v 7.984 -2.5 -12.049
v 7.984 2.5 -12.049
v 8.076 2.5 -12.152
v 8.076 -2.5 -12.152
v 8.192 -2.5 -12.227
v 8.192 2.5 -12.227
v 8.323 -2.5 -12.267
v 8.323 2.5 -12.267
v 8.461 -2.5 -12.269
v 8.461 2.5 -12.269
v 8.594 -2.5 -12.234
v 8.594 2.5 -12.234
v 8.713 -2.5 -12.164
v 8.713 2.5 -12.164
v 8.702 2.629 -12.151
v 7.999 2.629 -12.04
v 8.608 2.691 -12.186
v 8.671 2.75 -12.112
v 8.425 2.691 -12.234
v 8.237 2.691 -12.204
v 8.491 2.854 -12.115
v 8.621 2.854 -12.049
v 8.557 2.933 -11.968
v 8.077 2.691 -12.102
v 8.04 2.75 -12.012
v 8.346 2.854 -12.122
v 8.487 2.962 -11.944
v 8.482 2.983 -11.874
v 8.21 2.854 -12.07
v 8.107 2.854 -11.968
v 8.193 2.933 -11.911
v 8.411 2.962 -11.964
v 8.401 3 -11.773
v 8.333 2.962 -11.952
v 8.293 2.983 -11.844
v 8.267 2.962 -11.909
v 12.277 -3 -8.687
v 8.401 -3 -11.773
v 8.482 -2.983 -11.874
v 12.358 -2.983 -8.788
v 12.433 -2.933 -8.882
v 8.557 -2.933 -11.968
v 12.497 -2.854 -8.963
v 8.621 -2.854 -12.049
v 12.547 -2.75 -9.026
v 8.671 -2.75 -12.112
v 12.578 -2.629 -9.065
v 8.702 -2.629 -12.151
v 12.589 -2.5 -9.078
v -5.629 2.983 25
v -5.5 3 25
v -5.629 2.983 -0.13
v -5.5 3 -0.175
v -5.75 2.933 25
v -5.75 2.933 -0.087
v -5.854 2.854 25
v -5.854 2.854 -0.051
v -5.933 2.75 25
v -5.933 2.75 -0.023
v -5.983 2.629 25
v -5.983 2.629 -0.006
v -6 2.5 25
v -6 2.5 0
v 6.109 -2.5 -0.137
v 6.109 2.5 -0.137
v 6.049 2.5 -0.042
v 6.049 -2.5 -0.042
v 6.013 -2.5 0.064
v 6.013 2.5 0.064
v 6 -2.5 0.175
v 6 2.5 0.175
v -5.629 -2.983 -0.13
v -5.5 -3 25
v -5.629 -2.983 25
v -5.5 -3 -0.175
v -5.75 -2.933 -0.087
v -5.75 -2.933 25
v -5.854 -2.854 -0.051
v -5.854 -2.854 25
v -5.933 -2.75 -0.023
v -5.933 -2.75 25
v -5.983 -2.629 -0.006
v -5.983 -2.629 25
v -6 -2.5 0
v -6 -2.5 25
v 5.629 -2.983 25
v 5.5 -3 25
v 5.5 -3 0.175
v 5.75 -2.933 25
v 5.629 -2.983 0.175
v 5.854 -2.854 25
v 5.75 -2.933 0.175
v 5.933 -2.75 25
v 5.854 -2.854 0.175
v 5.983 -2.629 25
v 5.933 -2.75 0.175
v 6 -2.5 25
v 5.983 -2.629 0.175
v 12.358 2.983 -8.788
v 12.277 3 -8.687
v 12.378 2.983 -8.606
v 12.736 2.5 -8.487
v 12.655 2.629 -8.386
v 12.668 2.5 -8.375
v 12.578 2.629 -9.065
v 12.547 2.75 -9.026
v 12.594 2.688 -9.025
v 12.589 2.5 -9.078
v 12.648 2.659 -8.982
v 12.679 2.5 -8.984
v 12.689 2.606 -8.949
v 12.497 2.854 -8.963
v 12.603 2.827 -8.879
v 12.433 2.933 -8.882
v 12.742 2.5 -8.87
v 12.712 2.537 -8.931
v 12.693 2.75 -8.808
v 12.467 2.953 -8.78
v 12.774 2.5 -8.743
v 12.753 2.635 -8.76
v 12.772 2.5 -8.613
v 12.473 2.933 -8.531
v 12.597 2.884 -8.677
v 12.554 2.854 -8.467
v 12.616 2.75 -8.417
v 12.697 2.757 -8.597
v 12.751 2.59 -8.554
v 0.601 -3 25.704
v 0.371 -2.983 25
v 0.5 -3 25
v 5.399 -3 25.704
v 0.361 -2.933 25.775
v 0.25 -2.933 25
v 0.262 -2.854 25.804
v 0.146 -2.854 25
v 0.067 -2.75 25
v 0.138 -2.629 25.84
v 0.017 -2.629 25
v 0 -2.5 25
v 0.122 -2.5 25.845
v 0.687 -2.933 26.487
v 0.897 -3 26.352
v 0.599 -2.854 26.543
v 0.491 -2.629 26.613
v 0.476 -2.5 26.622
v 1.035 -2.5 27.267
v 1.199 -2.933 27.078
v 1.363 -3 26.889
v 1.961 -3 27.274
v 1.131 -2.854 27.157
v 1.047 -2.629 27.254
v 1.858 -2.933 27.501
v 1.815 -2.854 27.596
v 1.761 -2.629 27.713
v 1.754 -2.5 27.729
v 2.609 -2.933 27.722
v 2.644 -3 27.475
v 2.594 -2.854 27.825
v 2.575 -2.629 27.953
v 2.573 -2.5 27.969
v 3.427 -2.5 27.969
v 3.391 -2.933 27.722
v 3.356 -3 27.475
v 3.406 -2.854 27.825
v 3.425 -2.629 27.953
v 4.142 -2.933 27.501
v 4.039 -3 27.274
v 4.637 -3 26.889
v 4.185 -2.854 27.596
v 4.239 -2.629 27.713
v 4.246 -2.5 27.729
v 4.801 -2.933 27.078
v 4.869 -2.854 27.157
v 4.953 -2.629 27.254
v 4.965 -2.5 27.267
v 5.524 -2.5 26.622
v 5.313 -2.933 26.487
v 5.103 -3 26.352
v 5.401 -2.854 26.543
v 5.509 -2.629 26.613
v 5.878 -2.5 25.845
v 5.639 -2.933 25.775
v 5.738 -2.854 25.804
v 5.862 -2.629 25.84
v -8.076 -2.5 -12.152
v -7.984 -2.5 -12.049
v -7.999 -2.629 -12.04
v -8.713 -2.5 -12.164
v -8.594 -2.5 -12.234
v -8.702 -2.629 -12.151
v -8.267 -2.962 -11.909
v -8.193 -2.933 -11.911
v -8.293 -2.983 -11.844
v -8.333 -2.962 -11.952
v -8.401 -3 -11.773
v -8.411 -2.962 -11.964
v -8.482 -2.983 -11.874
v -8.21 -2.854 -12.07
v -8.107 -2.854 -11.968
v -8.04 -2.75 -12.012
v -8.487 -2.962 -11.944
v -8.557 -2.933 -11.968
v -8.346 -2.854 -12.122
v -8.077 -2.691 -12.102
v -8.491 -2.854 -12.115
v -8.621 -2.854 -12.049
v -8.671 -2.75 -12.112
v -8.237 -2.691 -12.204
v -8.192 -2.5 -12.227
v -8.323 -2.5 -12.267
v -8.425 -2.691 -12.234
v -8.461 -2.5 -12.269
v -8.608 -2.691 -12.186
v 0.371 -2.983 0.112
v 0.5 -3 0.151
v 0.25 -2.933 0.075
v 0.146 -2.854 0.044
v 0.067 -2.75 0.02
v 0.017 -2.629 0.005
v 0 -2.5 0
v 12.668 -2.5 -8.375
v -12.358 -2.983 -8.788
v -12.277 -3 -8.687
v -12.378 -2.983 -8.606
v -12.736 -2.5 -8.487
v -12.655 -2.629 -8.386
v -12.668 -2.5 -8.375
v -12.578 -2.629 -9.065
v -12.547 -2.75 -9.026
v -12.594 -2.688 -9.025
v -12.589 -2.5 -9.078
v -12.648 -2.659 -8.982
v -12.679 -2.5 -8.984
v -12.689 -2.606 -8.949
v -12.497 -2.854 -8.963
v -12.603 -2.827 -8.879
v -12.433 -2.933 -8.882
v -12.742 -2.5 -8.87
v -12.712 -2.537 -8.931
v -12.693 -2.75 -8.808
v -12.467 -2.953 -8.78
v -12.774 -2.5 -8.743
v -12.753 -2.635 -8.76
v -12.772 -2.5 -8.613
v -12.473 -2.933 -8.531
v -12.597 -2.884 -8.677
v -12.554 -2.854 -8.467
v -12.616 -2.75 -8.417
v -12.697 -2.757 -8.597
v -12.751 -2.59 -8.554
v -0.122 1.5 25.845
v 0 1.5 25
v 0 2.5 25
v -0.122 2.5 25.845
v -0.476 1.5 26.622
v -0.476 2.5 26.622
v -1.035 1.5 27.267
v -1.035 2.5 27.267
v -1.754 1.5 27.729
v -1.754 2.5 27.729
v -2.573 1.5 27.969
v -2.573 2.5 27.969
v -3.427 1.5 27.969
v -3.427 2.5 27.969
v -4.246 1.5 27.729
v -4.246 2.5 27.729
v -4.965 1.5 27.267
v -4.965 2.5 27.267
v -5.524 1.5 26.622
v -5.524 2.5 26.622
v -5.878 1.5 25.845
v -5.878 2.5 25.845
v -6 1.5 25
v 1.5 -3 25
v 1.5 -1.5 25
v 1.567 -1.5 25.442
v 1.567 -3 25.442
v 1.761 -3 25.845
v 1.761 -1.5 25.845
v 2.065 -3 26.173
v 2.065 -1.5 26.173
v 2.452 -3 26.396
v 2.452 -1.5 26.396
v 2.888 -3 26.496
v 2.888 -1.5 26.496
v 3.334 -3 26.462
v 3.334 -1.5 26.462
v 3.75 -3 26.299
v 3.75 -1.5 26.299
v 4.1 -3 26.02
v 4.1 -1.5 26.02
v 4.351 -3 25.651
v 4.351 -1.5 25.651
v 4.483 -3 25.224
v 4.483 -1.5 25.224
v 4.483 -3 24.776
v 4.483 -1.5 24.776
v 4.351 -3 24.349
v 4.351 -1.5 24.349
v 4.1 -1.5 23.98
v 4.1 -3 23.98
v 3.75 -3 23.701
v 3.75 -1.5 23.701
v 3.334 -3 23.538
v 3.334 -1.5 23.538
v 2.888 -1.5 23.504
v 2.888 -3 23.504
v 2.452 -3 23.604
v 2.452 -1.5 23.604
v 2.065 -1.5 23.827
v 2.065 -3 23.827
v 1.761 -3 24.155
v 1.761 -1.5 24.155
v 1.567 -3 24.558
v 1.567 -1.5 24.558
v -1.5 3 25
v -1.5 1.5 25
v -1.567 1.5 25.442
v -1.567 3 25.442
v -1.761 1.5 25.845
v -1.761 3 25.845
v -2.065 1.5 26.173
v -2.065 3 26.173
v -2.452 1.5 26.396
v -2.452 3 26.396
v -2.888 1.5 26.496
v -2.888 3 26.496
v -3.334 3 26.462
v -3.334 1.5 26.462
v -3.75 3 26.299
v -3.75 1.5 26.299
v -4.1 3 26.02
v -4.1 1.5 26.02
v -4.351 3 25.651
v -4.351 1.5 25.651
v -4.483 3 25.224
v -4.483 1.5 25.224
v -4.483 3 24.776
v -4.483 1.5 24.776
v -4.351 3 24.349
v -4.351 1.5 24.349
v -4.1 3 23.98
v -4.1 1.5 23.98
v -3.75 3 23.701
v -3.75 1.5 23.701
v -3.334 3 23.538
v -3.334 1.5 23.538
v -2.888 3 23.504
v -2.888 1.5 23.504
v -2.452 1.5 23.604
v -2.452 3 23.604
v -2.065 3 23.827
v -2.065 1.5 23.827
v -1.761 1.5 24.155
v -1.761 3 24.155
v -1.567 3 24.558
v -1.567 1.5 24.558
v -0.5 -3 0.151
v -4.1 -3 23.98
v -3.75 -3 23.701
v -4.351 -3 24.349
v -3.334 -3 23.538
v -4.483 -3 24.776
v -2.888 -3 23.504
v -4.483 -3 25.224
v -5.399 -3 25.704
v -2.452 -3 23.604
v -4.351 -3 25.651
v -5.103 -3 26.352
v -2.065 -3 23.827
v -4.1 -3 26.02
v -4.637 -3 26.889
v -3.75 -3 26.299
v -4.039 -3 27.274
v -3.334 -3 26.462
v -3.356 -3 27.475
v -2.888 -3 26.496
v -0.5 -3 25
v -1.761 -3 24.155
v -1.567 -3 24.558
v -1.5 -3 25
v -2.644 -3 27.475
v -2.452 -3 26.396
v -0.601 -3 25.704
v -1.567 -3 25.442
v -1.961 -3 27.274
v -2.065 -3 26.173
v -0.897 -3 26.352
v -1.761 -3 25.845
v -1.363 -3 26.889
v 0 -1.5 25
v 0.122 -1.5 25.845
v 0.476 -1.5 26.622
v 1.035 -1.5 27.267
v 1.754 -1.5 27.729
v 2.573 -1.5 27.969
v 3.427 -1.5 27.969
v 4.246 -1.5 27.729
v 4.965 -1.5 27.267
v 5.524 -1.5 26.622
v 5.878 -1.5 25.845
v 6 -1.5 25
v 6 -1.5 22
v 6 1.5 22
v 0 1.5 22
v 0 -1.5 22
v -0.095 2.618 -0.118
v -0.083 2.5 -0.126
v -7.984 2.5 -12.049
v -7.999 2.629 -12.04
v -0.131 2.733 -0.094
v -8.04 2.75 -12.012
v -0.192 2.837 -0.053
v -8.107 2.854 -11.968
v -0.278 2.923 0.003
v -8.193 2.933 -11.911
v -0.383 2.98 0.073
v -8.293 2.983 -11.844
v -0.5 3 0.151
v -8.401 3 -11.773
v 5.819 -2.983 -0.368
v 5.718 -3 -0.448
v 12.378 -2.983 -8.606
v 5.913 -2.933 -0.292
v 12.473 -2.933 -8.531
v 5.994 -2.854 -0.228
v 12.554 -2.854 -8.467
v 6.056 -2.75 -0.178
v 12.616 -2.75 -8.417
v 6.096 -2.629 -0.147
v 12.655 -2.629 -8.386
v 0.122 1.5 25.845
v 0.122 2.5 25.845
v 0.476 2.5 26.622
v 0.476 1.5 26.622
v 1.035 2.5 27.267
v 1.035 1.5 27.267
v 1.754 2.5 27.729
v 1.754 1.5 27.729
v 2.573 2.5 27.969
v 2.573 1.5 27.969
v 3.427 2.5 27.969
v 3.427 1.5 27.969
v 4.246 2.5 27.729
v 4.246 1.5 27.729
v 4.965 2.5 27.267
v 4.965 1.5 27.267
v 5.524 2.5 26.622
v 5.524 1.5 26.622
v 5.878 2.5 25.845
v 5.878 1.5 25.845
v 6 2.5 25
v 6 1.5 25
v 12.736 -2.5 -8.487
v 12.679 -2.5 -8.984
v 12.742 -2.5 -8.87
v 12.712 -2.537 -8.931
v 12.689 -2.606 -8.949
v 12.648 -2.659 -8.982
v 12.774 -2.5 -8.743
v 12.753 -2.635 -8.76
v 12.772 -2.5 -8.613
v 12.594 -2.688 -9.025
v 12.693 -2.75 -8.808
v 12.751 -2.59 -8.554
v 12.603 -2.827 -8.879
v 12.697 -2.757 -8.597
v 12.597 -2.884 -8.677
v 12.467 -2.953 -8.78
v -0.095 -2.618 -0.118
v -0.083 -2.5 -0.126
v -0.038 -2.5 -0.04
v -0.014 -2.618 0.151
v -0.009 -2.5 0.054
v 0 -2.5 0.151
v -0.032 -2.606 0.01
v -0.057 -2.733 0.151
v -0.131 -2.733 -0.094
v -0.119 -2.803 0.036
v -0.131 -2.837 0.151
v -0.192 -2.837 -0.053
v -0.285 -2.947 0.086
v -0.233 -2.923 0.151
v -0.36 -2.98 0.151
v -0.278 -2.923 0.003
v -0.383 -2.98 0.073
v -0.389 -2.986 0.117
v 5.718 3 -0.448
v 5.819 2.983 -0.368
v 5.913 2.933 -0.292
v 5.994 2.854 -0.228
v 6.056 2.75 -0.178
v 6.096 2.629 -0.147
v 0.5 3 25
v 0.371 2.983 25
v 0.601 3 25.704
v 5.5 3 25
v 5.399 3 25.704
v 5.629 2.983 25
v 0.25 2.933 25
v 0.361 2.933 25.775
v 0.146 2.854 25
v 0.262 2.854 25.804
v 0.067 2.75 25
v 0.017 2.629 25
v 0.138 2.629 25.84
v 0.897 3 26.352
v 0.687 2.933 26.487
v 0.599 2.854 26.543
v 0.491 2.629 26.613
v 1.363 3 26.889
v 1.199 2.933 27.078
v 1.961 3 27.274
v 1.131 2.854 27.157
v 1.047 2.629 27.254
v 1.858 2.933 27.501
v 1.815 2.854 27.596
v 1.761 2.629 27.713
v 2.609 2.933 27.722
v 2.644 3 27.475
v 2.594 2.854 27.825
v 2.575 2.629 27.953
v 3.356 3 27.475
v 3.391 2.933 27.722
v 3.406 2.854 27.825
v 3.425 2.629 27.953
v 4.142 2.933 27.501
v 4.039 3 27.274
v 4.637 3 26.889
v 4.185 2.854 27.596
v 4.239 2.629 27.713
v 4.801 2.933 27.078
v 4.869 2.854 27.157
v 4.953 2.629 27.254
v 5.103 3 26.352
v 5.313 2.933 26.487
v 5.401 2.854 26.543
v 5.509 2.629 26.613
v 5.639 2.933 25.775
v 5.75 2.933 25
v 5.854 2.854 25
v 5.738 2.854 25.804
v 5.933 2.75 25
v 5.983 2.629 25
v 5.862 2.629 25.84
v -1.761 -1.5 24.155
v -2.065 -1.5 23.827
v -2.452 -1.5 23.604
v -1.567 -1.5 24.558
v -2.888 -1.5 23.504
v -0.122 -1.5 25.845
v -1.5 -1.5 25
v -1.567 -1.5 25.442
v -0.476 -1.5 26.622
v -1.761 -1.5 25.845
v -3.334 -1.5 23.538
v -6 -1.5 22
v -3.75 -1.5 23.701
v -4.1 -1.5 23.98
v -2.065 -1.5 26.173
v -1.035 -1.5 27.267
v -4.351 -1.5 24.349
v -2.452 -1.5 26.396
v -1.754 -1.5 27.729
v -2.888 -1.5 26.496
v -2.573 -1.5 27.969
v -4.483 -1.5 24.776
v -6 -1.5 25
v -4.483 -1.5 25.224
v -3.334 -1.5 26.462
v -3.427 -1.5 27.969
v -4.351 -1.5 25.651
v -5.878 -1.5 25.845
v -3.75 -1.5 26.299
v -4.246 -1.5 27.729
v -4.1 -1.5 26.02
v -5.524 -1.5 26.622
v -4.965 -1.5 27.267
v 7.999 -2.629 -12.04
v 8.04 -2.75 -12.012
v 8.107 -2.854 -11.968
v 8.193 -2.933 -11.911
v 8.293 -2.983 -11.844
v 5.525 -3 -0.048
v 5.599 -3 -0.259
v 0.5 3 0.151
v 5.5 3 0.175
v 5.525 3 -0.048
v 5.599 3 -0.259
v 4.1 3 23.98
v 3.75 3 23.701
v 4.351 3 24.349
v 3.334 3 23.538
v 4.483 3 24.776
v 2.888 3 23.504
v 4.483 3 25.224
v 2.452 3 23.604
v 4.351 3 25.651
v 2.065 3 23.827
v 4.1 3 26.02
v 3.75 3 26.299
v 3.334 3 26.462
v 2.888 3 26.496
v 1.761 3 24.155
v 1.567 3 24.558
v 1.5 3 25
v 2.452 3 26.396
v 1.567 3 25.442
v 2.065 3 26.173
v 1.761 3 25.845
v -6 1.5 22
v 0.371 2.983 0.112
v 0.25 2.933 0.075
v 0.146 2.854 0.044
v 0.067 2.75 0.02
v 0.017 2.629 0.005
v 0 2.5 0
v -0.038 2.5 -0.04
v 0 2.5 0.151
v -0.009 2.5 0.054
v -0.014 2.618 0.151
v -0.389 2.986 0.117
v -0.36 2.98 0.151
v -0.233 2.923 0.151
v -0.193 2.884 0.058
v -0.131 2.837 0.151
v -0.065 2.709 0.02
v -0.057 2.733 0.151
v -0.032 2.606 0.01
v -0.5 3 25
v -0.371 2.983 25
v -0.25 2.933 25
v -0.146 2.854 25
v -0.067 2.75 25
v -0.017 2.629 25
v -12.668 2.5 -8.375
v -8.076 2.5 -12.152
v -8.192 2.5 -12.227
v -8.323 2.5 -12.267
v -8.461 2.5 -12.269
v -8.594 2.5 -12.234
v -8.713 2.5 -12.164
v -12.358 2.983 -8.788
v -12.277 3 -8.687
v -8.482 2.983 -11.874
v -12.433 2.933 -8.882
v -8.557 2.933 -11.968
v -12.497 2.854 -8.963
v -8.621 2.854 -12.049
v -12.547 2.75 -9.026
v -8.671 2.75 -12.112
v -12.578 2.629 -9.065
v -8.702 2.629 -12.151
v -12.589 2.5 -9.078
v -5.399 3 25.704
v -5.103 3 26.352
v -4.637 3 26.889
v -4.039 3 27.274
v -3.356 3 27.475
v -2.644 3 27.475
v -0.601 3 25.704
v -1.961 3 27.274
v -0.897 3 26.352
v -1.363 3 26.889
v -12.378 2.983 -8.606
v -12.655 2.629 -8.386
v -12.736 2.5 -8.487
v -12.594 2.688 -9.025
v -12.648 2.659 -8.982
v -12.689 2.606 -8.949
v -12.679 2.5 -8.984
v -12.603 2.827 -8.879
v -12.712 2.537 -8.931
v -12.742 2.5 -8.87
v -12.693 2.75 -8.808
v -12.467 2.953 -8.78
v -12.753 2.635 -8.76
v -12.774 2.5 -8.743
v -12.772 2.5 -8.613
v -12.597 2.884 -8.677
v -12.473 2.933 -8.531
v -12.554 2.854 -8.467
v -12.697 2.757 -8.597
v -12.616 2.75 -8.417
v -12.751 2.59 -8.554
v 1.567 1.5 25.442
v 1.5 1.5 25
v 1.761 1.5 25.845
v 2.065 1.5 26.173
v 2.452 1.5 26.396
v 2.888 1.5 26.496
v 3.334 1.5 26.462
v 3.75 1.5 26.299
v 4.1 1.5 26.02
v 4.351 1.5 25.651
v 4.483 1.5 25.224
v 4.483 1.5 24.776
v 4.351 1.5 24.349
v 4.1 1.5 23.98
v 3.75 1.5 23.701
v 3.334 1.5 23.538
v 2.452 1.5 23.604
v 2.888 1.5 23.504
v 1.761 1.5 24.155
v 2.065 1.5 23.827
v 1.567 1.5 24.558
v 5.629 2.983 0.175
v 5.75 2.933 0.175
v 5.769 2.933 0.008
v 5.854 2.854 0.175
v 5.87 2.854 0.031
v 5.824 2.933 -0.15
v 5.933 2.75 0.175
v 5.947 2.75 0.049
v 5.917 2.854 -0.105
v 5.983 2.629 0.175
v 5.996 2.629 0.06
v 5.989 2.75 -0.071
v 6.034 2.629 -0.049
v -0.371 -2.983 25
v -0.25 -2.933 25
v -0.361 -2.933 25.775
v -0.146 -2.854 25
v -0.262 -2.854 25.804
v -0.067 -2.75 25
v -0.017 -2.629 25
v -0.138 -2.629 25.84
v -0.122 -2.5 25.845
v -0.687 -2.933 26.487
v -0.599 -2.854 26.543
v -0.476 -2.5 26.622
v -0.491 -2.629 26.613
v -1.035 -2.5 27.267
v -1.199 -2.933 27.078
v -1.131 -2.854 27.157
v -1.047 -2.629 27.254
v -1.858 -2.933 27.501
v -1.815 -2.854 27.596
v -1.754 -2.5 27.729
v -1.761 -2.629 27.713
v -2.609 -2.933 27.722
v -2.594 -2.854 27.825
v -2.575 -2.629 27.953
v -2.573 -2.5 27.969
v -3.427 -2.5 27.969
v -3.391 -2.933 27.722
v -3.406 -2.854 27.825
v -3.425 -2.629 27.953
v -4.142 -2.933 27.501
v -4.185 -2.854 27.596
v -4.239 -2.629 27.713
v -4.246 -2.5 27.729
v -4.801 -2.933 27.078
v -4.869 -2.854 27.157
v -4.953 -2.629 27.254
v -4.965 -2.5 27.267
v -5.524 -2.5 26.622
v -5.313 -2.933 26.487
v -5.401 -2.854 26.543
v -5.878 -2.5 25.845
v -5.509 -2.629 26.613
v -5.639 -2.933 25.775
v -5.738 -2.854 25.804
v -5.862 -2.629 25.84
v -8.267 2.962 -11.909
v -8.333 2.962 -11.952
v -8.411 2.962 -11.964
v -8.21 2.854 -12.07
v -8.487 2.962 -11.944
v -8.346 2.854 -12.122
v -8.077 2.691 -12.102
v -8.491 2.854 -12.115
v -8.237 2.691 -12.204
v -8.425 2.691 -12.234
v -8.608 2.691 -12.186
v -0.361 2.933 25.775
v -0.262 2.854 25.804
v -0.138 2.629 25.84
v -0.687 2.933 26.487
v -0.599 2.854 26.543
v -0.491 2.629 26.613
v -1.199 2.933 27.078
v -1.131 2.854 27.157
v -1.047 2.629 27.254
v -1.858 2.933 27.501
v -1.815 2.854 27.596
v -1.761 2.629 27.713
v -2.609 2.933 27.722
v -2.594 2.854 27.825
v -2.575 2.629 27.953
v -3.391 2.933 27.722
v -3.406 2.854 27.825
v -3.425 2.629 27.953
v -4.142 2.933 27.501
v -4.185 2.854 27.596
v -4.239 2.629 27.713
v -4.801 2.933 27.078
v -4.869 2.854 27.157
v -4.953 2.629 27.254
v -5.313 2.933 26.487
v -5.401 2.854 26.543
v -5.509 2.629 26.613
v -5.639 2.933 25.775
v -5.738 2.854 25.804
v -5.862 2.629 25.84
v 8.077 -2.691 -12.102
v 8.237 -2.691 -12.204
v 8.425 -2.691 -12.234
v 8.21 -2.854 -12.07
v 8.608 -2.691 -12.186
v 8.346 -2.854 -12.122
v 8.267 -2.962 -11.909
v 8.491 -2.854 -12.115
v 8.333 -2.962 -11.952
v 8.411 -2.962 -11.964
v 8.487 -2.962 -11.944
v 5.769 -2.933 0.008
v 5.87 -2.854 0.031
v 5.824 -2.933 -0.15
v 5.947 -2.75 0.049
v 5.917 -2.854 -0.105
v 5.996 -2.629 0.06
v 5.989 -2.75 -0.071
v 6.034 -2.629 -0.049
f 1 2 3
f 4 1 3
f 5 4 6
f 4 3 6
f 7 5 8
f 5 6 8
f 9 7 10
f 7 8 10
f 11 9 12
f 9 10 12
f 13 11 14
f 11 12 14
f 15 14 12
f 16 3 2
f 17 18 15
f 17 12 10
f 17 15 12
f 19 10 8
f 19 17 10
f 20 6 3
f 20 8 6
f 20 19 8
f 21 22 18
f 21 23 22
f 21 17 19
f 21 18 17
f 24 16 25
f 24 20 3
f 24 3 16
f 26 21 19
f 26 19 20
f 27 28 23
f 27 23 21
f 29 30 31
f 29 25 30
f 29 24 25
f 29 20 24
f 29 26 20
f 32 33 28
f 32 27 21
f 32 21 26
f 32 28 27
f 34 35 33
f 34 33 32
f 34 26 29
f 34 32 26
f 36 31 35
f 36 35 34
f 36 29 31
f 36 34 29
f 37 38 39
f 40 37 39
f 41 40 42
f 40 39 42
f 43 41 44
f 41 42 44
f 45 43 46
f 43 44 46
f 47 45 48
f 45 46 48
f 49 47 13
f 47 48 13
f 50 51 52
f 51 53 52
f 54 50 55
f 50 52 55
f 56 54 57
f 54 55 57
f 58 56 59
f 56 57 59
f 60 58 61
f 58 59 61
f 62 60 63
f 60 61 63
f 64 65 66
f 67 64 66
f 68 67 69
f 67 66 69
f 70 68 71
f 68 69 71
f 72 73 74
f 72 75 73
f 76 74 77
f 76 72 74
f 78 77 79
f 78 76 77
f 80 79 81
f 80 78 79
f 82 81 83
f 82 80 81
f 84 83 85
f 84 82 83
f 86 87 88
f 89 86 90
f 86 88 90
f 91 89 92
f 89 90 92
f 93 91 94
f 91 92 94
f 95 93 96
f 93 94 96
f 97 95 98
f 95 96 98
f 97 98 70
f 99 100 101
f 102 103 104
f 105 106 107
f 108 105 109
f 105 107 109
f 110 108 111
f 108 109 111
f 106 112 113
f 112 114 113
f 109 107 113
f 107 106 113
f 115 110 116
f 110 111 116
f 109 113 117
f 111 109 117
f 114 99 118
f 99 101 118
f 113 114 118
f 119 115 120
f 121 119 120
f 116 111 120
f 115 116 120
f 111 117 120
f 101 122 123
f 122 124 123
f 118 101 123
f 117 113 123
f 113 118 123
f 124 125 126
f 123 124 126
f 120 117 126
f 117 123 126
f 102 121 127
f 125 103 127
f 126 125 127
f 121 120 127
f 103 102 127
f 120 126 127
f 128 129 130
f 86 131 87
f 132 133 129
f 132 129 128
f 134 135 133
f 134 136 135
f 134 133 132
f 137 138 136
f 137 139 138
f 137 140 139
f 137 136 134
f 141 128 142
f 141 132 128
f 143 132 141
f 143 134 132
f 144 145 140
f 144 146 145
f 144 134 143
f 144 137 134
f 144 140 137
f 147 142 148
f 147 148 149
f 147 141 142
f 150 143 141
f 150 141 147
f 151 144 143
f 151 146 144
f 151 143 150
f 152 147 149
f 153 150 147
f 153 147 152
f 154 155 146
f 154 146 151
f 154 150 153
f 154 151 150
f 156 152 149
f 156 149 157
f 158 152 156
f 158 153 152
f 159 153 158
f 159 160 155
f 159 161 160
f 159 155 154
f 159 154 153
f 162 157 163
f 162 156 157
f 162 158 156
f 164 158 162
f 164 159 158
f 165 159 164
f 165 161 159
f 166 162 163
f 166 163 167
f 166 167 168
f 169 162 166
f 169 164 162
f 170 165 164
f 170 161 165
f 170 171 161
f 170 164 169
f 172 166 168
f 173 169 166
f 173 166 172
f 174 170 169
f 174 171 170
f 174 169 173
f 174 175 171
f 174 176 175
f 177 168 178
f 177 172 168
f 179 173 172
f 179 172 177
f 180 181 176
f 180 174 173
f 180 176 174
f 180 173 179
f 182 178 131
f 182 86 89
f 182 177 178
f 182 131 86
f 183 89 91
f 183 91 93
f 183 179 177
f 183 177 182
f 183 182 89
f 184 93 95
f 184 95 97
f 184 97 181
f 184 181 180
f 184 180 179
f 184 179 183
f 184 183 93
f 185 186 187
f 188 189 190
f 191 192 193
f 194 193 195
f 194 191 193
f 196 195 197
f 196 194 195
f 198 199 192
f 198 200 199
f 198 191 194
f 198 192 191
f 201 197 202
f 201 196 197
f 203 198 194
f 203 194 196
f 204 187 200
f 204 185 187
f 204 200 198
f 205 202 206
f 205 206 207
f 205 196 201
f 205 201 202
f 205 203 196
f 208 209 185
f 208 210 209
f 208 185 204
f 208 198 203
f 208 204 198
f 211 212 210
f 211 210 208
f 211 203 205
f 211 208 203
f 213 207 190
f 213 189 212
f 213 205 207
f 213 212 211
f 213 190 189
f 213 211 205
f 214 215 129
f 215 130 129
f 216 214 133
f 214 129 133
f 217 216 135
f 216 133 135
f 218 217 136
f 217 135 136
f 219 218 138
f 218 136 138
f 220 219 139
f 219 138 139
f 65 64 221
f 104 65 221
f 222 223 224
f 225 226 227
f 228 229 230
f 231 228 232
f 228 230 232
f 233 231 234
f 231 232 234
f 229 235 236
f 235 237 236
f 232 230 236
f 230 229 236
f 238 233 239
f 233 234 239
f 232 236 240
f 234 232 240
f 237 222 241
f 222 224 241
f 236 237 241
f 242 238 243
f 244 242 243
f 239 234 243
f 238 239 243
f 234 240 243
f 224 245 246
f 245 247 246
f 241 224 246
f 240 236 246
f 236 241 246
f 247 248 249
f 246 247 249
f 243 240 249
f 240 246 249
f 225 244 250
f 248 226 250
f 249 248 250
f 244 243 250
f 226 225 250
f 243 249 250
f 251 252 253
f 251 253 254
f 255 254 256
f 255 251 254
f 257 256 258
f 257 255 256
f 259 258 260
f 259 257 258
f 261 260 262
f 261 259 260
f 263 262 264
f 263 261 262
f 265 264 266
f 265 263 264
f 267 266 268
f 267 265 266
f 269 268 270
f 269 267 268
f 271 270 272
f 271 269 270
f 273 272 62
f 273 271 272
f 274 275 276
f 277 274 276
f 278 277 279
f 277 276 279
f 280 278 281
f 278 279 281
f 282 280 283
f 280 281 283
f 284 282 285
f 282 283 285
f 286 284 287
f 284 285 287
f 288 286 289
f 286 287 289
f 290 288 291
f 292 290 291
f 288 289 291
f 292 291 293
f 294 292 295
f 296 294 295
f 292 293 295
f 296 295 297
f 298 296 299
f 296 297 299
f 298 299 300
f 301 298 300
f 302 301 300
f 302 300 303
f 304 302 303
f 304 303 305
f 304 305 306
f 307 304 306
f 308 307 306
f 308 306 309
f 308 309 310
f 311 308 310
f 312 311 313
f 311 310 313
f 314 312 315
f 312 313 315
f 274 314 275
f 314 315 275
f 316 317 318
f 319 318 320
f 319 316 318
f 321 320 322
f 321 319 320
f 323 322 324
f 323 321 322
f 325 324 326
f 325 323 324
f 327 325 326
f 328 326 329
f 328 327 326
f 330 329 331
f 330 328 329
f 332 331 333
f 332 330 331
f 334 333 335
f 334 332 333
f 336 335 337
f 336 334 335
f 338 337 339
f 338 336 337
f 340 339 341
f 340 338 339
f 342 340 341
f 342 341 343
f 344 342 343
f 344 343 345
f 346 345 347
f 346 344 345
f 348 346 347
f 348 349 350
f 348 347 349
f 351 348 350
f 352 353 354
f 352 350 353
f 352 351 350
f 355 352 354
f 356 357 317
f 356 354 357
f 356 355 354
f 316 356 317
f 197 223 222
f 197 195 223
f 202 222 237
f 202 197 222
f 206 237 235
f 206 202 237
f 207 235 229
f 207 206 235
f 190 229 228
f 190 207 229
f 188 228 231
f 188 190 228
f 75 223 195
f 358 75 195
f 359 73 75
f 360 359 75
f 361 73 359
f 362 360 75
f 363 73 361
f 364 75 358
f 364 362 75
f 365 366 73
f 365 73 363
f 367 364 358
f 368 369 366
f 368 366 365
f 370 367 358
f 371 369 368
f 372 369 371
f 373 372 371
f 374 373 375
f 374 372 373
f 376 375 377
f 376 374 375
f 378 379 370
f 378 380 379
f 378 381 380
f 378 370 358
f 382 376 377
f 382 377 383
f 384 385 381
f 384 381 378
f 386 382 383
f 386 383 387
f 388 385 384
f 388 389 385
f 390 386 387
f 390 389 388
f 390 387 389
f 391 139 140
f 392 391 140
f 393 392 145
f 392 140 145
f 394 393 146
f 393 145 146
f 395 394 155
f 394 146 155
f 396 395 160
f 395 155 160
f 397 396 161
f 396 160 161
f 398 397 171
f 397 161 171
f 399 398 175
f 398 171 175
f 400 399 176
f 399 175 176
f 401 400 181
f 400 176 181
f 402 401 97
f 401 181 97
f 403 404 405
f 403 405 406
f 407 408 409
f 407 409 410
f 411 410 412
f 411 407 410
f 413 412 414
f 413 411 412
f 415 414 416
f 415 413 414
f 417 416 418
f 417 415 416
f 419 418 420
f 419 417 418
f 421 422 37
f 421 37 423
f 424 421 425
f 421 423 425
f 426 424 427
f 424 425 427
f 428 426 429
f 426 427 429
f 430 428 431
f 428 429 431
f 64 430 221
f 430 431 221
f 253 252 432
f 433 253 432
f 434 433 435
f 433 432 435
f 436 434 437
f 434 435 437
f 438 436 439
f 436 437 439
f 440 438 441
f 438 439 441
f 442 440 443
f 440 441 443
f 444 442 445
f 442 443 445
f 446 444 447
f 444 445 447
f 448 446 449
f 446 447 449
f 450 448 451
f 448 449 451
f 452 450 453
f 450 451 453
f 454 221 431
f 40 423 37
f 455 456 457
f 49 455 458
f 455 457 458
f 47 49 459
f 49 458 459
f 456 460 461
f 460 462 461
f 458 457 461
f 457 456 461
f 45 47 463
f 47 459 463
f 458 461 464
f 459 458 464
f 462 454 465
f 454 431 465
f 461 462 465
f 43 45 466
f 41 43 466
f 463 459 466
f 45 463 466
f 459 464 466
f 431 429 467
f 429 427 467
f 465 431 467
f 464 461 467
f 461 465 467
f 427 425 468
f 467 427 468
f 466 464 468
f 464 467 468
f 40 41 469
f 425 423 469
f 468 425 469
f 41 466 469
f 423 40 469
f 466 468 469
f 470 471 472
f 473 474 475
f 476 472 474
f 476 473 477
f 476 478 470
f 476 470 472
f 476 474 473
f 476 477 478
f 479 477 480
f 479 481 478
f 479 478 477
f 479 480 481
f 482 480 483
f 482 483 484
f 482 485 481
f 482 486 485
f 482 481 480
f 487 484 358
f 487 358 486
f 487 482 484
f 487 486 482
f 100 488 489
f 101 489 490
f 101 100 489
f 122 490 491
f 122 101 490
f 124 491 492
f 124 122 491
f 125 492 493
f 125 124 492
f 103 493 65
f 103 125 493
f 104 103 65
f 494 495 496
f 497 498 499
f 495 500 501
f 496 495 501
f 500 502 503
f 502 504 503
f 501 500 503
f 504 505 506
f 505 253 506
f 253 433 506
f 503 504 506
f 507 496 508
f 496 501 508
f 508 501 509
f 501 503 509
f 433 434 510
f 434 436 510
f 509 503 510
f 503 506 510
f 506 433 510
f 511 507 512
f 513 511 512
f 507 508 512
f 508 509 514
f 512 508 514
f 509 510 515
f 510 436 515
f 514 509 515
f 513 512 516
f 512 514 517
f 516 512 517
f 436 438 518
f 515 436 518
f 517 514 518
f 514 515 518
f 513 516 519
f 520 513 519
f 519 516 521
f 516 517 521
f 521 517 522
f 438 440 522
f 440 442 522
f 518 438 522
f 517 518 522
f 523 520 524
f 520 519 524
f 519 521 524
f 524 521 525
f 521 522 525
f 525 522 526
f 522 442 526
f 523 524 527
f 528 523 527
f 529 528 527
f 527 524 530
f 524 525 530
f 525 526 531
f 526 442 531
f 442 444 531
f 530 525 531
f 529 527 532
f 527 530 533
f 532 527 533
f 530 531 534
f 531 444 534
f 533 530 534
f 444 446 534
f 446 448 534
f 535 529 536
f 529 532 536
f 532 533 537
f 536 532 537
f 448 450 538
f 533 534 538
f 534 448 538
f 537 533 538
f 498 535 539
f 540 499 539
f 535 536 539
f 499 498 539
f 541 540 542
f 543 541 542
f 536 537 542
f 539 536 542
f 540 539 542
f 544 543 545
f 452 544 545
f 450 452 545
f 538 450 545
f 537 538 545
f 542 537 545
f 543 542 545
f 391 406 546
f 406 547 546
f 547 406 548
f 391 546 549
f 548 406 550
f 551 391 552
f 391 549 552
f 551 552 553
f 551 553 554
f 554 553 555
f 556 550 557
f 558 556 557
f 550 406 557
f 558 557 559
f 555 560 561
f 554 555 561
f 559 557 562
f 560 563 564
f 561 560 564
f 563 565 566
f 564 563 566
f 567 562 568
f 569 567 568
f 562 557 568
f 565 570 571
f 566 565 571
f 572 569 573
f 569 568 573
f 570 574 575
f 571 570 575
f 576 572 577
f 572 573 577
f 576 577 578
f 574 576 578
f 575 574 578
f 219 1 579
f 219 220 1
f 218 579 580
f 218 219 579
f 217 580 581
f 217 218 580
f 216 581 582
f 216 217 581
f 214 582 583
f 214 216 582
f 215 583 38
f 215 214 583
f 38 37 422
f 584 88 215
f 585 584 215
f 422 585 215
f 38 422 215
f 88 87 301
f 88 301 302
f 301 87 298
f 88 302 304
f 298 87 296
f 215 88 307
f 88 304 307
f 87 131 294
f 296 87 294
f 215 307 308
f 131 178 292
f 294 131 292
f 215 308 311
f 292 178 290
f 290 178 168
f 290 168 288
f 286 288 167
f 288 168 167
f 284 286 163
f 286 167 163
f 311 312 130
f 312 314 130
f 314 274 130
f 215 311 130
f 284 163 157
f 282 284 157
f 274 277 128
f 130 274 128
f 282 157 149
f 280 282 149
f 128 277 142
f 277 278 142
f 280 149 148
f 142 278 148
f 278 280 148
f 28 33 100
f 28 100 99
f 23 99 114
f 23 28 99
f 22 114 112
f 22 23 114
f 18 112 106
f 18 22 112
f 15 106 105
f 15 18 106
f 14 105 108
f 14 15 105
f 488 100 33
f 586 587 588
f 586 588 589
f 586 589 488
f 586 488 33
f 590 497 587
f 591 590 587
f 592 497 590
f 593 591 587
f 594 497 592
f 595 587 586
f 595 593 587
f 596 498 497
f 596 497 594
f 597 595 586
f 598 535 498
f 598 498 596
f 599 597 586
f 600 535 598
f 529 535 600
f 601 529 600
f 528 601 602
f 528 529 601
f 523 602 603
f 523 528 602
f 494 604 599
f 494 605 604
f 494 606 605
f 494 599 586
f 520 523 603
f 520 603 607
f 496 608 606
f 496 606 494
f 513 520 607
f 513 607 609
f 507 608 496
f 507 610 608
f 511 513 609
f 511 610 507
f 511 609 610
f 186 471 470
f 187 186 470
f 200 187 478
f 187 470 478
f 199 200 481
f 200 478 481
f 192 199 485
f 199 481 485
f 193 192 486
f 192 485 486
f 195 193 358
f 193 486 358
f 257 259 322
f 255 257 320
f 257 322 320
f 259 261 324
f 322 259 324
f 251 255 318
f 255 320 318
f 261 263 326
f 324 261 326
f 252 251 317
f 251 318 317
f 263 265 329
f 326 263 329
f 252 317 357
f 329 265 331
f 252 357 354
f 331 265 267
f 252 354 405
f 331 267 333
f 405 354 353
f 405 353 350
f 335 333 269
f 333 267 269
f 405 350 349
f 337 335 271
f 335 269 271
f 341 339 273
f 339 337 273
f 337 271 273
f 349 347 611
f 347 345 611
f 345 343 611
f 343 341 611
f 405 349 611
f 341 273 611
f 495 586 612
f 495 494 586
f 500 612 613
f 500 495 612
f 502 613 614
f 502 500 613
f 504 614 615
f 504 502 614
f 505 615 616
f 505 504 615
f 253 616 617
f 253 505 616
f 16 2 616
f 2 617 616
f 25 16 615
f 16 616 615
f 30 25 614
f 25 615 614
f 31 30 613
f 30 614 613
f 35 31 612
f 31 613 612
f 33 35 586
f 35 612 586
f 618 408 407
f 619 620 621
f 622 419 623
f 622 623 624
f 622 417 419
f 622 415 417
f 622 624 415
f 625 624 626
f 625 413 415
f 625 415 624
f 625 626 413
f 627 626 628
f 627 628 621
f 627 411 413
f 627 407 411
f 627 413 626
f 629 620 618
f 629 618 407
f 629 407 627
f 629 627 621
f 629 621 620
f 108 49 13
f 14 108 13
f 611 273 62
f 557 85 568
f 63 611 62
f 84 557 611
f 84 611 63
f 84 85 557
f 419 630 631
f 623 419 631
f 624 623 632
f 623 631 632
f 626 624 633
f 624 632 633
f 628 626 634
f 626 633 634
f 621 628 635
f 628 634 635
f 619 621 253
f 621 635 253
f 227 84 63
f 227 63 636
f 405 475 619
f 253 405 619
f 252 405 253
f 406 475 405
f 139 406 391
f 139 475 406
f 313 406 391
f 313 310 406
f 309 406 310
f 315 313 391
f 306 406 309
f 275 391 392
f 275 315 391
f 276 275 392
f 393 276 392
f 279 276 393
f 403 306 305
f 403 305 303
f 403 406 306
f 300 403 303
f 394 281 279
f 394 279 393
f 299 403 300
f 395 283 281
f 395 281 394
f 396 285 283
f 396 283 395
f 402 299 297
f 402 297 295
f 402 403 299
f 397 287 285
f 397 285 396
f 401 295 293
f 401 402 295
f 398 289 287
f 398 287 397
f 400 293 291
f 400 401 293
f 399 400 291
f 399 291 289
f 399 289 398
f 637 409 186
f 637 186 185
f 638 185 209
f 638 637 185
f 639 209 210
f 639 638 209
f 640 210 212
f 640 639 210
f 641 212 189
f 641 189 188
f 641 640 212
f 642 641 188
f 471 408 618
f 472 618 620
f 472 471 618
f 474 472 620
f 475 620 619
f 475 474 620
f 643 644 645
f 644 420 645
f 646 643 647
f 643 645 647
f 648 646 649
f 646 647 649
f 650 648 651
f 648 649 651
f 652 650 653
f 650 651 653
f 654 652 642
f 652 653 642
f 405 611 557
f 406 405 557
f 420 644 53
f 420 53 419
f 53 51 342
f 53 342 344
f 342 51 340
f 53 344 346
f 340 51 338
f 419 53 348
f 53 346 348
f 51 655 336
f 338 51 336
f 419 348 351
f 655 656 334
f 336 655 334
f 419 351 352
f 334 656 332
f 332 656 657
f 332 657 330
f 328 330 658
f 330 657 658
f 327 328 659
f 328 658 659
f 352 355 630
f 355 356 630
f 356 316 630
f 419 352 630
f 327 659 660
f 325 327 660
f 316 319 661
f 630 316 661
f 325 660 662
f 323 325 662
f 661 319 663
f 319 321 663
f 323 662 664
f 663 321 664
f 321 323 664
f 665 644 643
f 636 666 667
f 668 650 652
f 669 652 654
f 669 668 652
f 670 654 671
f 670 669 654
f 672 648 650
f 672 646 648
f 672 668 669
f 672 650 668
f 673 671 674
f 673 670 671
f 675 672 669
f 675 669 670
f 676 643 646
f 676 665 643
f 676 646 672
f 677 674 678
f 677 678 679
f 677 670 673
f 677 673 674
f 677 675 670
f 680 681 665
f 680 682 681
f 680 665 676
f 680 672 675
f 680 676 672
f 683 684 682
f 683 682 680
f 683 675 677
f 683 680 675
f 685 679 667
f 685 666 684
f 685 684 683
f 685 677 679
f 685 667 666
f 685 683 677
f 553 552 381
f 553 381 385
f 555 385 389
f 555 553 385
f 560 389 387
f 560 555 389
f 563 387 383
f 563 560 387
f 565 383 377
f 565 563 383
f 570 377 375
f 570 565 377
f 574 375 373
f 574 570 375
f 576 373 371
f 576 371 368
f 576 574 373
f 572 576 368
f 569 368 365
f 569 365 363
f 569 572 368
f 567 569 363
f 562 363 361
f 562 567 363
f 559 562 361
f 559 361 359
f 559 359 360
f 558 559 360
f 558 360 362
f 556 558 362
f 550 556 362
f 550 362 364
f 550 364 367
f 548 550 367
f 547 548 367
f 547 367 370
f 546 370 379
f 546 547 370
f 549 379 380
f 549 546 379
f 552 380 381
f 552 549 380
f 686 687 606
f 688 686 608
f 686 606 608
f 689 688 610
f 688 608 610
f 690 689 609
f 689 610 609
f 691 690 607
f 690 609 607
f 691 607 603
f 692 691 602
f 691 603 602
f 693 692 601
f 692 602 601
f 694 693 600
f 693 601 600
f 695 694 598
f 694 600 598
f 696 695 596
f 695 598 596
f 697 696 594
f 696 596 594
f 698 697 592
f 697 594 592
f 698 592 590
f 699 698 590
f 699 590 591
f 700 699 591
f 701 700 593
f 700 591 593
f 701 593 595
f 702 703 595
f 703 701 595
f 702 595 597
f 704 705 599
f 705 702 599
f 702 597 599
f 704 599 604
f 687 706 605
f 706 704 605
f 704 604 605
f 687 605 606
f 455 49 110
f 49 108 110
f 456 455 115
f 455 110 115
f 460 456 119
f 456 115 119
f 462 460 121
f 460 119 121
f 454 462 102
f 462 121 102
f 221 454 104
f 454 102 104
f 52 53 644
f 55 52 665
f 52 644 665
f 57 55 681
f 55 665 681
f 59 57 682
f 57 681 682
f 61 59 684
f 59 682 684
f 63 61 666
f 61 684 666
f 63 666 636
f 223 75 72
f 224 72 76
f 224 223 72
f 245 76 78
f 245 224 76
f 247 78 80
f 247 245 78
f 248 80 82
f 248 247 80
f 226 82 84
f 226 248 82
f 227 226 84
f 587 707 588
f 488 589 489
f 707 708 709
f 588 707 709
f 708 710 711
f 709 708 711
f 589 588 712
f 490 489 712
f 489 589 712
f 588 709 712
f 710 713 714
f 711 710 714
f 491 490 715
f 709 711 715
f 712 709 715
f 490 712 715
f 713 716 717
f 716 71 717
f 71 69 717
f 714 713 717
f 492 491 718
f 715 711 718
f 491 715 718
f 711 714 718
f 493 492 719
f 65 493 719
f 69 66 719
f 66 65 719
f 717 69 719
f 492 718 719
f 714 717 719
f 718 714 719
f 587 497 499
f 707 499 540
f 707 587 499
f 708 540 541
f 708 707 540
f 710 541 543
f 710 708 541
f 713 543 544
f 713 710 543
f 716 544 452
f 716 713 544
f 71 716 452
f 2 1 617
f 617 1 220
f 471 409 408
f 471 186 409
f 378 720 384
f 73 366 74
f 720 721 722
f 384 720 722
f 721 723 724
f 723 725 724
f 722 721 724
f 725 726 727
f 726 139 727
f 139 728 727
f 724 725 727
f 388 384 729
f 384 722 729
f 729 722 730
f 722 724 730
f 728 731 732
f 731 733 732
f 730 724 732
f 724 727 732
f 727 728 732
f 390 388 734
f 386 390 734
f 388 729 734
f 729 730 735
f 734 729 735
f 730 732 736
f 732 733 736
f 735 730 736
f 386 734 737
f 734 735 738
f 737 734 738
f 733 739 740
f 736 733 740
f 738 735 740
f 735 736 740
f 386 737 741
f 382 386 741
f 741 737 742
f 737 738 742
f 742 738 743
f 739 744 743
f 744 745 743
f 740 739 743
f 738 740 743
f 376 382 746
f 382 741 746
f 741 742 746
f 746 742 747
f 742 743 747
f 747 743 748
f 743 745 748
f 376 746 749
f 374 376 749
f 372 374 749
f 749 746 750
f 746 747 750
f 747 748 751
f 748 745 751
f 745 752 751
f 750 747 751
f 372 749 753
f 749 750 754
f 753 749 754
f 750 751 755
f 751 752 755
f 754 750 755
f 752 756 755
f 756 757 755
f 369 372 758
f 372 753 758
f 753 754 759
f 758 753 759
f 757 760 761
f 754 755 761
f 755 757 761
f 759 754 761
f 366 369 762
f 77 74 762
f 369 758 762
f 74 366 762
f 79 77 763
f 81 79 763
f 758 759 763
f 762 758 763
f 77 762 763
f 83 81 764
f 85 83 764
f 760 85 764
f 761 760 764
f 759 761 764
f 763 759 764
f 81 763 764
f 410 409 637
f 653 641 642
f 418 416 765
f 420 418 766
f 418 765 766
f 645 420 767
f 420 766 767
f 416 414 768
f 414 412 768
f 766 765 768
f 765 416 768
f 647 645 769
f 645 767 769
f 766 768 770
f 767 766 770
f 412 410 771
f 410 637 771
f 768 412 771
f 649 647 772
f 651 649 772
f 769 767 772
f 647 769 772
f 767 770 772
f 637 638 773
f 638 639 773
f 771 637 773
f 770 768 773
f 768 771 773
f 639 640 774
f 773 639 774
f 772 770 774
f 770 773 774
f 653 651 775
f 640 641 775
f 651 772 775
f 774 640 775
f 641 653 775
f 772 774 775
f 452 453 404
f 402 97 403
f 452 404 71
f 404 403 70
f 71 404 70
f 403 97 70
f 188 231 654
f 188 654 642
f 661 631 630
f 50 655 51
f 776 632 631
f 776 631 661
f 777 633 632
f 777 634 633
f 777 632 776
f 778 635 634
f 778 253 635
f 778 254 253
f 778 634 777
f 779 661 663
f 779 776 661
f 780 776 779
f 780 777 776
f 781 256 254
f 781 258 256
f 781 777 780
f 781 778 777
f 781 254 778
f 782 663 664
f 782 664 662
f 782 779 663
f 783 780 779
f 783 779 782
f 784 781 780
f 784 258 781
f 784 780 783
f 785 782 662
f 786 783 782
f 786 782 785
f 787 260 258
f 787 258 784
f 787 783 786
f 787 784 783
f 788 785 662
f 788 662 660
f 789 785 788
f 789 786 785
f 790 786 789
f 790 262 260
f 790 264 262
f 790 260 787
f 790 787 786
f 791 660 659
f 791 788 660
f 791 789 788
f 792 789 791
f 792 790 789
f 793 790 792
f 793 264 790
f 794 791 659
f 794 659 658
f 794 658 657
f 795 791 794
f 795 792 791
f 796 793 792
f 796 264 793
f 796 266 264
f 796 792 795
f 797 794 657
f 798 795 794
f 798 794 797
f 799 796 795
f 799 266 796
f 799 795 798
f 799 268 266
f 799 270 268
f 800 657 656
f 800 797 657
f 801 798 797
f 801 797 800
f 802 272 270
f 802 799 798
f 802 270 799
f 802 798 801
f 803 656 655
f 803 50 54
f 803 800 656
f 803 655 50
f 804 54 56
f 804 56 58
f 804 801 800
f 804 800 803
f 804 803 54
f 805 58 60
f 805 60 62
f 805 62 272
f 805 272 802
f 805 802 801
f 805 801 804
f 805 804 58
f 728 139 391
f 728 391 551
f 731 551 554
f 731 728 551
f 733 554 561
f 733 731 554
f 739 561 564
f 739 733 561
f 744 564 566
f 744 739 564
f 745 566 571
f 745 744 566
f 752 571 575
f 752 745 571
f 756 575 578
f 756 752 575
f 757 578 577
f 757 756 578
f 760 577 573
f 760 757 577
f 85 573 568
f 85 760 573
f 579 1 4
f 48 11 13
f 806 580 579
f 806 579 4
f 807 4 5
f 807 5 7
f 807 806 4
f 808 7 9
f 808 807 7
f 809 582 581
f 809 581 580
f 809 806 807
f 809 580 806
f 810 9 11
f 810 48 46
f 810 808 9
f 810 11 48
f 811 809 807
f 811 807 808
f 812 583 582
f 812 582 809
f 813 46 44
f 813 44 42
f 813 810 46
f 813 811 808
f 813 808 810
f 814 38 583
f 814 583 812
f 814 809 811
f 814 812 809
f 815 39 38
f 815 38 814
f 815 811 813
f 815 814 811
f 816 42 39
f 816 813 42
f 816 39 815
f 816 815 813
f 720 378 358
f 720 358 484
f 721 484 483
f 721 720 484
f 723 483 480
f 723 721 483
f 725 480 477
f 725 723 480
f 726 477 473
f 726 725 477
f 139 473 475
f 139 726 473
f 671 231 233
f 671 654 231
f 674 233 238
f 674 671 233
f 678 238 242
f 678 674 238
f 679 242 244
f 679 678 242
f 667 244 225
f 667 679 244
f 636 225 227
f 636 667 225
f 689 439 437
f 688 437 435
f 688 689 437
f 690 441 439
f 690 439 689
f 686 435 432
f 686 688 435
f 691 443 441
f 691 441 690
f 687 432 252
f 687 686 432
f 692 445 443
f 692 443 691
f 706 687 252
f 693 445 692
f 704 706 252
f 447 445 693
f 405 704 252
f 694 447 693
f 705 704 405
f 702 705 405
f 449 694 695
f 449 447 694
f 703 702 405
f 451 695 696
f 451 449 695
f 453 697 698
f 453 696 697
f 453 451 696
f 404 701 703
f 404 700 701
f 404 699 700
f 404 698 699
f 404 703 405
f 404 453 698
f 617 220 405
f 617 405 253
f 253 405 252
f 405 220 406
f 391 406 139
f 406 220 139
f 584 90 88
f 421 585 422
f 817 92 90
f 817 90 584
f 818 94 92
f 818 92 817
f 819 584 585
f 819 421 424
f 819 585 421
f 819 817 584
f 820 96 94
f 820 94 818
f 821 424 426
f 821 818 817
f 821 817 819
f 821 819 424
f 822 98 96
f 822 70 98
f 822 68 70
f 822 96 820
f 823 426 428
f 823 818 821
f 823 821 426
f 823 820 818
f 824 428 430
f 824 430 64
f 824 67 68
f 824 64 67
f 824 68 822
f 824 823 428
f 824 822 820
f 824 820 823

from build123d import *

# Parameters (mm, degrees)
F0_R         = 1.5
F1_DEPTH     = 3
F2_W         = 3
F2_H         = 5.4226633161
F2_H_2       = 3
F3_DEPTH     = 6.001
F5_R         = 0.5
F5_2_R       = 0.5
F6_T1_DEPTH  = 5
F6_T6_DEPTH  = 0.5
F6_T12_DEPTH = 0.5
F7_R         = 0.5


# Not quite as in the source:
# - a fillet or chamfer that OpenCascade refuses, or shapes differently, is made with other operations: its cross-section is extruded or revolved along the edge and cut away or added


with BuildPart() as f1:
    # F0 (on Front) → F1 (new body, symmetric)
    with BuildSketch(Plane.XZ):
        with BuildLine():
            Line((-8.285876948, -12.5037691598), (0, 0))
            Line((0, 0), (0, 25))
            ThreePointArc((0, 25), (-3, 28), (-6, 25))
            Line((-6, 25), (-6, 0))
            Line((-6, 0), (-12.9798034719, -8.766516989))
            Line((-12.9798034719, -8.766516989), (-8.285876948, -12.5037691598))
        make_face()
        with Locations((-3, 25)):
            Circle(F0_R, mode=Mode.SUBTRACT)
    extrude(amount=F1_DEPTH, both=True)

    # F2 (on face) → F3 (cut, through all)
    with BuildSketch(Plane(origin=(-6, 0, 0), x_dir=(0, -1, 0), z_dir=(-1, 0, 0))):
        with Locations((0, 27.7113316581)):
            Rectangle(F2_W, F2_H)
        with Locations((0, 23.5)):
            Rectangle(F2_W, F2_H_2)
    extrude(amount=-F3_DEPTH, mode=Mode.SUBTRACT)


with BuildPart() as f4_1:
    # F4: instance of F1
    add(f1.part.mirror(Plane.YZ))

    # F5
    f5_edges = [f4_1.edges().sort_by_distance(p)[0] for p in [
        (6, -3, 12.5),
        (4.142938, -3, -6.251885),
        (9.489902, -3, -4.383258),
        (9.489902, 3, -4.383258),
        (6, 0, 0),
        (6, 3, 12.5),
        (4.142938, 3, -6.251885),
        (10.63284, 3, -10.635143),
        (12.979803, 0, -8.766517),
        (10.63284, -3, -10.635143),
    ]]
    fillet(f5_edges, radius=F5_R)

    # F6: fillet of radius 0.5 on 1 edges, made by hand

    # F6_s2 → F6_t1 (cut)
    with BuildSketch(Plane.XZ.offset(-2.5)):
        with BuildLine():
            ThreePointArc((7.9844875816, -12.0489587531), (8.3233111968, -12.2666463263), (8.7127175678, -12.1639233985))
            Line((8.7127175678, -12.1639233985), (8.285876948, -12.5037691598))
            Line((8.285876948, -12.5037691598), (7.9844875816, -12.0489587531))
        make_face()
    extrude(amount=F6_T1_DEPTH, mode=Mode.SUBTRACT)


with BuildPart() as f1_1:
    add(f1.part)

    # F5#2
    f5_2_edges = [f1_1.edges().sort_by_distance(p)[0] for p in [
        (-6, -3, 12.5),
        (-4.142938, -3, -6.251885),
        (-9.489902, -3, -4.383258),
        (-10.63284, -3, -10.635143),
        (0, 3, 12.5),
        (-6, 3, 12.5),
        (-9.489902, 3, -4.383258),
        (-4.142938, 3, -6.251885),
        (-10.63284, 3, -10.635143),
        (-8.285877, 0, -12.503769),
        (-12.979803, 0, -8.766517),
    ]]
    fillet(f5_2_edges, radius=F5_2_R)

    # F7
    f7_edges = [f1_1.edges().sort_by_distance(p)[0] for p in [
        (0, 0, 0),
    ]]
    fillet(f7_edges, radius=F7_R)


with BuildPart() as f6_tool4:
    # F6_s5 → F6_t6 (new body)
    with BuildSketch(Plane.XZ.offset(2.5)):
        Polygon((8.4012798869, -11.7727628549), (7.9844875816, -12.0489587531), (8.285876948, -12.5037691598), (8.7127175678, -12.1639233985), align=None)
    extrude(amount=F6_T6_DEPTH)

    # F6_s7 → F6_t8 (revolve, cut)
    with BuildSketch(Plane(origin=(8.4012798869, -2.5, -11.7727628549), x_dir=(0.1559373803, 0, 0.9877669429), z_dir=(0.9877669429, 0, -0.1559373803))):
        with BuildLine():
            ThreePointArc((0, -0.5), (0.5, 0), (0, 0.5))
            Line((0, 0.5), (0, -0.5))
        make_face()
    revolve(axis=Axis((8.4012798869, -2.5, -11.7727628549), (0, -1, 0)), mode=Mode.SUBTRACT)


with BuildPart() as f4_1_1:
    add(f4_1.part)

    # F6_t3: cut F6_tool4
    add(f6_tool4.part, mode=Mode.SUBTRACT)


with BuildPart() as f6_tool10:
    # F6_s11 → F6_t12 (new body)
    with BuildSketch(Plane.XZ.offset(-2.5)):
        Polygon((8.4012798869, -11.7727628549), (7.9844875816, -12.0489587531), (8.285876948, -12.5037691598), (8.7127175678, -12.1639233985), align=None)
    extrude(amount=-F6_T12_DEPTH)

    # F6_s13 → F6_t14 (revolve, cut)
    with BuildSketch(Plane(origin=(8.4012798869, 2.5, -11.7727628549), x_dir=(0.1559373803, 0, 0.9877669429), z_dir=(-0.9877669429, 0, 0.1559373803))):
        with BuildLine():
            ThreePointArc((0, -0.5), (0.5, 0), (0, 0.5))
            Line((0, 0.5), (0, -0.5))
        make_face()
    revolve(axis=Axis((8.4012798869, 2.5, -11.7727628549), (0, 1, 0)), mode=Mode.SUBTRACT)


with BuildPart() as f4_1_2:
    add(f4_1_1.part)

    # F6_t9: cut F6_tool10
    add(f6_tool10.part, mode=Mode.SUBTRACT)


solid = Compound([f1_1.part, f4_1_2.part])
